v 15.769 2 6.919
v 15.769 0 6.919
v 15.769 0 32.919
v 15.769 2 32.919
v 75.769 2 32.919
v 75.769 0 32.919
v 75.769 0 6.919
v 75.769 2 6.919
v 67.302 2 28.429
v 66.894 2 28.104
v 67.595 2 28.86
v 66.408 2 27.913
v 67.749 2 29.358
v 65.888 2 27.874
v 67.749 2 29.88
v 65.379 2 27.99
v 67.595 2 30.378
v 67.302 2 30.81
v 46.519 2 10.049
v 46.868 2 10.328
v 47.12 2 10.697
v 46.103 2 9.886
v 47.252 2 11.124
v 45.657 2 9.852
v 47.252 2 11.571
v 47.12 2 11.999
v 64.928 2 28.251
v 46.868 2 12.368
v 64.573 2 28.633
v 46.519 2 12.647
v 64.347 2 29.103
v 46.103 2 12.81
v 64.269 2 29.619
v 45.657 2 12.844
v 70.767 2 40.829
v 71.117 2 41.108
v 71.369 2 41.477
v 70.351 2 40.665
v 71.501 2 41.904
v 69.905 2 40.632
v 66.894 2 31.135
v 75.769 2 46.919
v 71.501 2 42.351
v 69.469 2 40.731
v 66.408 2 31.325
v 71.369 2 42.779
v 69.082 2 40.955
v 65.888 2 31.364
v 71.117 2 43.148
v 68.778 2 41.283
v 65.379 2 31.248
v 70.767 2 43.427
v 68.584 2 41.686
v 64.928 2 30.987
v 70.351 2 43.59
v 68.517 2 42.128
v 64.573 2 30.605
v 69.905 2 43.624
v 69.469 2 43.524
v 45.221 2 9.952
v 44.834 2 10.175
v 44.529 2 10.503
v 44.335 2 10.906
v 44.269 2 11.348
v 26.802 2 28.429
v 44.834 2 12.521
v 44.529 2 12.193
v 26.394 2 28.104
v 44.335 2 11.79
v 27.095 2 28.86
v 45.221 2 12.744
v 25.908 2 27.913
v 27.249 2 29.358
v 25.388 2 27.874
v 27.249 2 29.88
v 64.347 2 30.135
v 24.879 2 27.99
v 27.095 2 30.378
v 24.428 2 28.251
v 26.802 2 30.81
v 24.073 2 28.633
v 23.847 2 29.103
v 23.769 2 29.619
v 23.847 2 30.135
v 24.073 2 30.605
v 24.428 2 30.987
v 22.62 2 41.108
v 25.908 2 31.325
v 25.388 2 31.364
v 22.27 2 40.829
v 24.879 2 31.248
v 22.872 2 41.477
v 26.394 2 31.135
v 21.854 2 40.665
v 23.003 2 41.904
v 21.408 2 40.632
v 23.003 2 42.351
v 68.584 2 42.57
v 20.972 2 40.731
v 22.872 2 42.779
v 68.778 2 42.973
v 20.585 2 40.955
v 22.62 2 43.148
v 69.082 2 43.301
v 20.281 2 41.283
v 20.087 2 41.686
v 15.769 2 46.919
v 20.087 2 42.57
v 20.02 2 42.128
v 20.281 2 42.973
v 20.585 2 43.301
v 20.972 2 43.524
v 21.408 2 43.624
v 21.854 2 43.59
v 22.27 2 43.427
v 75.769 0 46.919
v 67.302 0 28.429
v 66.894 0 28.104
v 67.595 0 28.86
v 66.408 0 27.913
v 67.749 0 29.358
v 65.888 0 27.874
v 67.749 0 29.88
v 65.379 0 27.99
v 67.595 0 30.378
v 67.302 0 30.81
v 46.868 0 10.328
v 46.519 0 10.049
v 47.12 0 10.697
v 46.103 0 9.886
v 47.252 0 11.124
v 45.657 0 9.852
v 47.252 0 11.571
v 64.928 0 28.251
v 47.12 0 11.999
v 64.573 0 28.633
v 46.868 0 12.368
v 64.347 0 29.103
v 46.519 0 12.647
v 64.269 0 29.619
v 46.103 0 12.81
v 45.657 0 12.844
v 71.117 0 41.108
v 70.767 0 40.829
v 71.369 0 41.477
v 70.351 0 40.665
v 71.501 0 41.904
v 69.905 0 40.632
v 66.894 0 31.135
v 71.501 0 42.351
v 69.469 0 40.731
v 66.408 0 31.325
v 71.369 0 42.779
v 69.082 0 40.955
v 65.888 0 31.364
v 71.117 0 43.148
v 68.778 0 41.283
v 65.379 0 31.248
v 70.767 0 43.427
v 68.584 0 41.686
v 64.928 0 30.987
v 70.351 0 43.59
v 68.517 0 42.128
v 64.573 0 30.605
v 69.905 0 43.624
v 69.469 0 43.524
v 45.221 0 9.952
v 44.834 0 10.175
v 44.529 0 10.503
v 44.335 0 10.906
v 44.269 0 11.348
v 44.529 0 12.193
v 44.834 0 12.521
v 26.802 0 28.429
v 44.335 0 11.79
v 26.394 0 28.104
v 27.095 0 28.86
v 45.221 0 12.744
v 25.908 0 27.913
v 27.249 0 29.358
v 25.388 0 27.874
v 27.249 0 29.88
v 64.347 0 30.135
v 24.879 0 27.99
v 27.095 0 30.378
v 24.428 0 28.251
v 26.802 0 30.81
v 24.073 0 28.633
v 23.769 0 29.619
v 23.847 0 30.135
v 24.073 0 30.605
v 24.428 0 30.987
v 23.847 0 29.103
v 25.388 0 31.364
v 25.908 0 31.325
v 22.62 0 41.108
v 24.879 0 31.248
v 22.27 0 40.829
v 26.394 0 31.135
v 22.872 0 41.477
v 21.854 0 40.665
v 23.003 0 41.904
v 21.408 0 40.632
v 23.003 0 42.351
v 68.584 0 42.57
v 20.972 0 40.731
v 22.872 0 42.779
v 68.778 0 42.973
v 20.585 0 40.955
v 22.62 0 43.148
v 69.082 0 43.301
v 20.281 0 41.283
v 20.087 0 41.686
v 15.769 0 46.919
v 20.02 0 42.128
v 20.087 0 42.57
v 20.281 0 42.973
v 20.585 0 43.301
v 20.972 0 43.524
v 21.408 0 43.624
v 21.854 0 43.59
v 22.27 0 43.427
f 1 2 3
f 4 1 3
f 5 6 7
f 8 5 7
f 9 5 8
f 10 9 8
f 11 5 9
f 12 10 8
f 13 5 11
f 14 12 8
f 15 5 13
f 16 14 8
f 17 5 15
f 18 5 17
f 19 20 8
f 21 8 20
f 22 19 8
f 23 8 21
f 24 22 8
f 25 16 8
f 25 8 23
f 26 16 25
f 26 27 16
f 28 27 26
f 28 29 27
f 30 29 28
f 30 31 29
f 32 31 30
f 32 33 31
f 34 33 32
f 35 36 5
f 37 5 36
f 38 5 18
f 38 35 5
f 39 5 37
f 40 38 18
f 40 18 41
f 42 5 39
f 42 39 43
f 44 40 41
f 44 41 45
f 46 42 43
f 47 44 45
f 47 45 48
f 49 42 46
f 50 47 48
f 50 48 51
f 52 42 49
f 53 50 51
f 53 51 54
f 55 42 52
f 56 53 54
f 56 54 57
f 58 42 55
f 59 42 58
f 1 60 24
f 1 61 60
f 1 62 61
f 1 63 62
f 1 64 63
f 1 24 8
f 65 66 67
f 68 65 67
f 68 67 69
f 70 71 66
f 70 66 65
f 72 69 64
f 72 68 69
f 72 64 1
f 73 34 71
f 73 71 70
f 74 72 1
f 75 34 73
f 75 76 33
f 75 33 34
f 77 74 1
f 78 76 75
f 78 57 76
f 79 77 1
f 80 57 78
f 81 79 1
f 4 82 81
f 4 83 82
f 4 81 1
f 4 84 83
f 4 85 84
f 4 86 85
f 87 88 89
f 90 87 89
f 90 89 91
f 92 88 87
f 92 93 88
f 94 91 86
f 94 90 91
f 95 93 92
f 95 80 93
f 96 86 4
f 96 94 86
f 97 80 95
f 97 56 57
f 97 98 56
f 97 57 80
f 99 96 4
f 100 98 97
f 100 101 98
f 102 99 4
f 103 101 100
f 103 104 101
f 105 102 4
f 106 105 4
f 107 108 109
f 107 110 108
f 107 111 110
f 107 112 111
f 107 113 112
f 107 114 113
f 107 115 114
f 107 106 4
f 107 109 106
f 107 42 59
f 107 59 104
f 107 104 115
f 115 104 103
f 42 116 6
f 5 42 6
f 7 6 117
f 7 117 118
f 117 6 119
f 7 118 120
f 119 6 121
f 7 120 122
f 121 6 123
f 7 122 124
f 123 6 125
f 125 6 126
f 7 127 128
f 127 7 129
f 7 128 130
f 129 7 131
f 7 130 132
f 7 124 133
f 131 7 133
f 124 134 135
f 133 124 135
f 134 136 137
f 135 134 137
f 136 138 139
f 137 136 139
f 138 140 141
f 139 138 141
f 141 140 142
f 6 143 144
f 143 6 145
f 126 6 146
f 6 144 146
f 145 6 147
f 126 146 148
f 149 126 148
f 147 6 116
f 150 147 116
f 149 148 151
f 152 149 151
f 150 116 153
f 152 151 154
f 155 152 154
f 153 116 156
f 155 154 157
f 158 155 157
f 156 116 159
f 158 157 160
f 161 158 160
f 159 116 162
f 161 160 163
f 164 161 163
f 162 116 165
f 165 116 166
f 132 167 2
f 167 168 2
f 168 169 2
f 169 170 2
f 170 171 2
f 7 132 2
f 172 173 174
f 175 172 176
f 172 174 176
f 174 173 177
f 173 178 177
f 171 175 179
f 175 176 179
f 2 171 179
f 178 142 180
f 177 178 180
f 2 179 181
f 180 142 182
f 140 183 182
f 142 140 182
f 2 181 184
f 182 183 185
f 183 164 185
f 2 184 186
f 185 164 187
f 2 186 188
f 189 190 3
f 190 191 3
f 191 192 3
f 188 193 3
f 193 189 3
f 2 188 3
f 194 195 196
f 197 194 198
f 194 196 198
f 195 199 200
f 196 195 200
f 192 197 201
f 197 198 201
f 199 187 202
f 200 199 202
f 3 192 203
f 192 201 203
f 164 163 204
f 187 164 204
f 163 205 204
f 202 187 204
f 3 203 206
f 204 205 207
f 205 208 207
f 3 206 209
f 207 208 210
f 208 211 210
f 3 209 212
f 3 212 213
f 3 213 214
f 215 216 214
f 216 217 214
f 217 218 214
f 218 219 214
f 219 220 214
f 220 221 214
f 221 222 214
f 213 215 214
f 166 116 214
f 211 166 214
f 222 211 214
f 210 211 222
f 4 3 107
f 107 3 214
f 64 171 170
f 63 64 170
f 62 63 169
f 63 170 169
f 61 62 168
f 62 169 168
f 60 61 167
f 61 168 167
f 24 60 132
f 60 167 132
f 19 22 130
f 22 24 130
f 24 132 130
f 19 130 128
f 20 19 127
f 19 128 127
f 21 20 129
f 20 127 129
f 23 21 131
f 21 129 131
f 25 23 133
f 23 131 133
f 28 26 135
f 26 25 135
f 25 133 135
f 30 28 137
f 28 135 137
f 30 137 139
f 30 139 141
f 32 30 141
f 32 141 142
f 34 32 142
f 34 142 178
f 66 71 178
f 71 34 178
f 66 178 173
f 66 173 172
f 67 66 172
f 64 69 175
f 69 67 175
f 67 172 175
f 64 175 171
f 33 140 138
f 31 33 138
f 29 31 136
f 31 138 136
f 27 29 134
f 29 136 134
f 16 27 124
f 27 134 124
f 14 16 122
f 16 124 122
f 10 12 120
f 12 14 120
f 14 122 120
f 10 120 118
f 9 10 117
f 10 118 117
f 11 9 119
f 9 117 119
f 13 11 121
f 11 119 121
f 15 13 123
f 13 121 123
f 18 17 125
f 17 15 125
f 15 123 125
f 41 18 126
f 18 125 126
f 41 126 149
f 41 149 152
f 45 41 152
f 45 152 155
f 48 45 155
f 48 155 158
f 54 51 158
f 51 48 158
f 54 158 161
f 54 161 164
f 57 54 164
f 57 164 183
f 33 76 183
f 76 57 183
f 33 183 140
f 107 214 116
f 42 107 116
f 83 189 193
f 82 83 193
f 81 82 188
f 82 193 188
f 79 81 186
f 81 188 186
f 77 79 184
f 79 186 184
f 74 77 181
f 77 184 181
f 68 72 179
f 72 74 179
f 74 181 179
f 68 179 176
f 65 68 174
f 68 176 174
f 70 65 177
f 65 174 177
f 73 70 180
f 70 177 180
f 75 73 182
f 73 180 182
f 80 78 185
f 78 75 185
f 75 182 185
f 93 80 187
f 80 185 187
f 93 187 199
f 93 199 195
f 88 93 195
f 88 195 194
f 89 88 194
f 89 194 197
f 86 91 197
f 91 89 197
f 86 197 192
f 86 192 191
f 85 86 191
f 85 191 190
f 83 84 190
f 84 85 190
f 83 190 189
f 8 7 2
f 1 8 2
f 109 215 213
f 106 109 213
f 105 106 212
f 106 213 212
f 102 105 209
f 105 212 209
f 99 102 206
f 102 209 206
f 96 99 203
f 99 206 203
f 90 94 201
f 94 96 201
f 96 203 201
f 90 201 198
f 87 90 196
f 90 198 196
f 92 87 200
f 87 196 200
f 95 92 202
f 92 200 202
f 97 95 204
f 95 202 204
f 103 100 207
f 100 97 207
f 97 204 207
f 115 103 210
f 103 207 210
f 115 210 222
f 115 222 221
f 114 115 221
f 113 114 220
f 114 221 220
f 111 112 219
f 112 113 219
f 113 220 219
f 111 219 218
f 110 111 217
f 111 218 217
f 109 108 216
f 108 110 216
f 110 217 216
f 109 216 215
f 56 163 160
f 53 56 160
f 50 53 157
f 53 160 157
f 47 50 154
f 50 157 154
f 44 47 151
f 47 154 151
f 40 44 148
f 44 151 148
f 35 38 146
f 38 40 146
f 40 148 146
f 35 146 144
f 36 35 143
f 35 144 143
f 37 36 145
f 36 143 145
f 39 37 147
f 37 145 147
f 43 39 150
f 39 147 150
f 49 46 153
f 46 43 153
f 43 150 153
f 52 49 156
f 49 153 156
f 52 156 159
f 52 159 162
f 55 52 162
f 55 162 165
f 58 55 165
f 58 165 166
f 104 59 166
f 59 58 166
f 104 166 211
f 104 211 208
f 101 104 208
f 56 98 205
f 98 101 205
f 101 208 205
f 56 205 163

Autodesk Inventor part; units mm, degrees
ref_plane "YZ Plane" through (0, 0, 0) normal (1, 0, 0) x (0, 1, 0)
ref_plane "XZ Plane" through (0, 0, 0) normal (0, 1, 0) x (-1, 0, 0)
ref_plane "XY Plane" through (0, 0, 0) normal (0, 0, 1) x (1, 0, 0)
sketch "Szkic1" plane through (0, 0, 0) normal (0, 1, 0) x (-1, 0, 0)
  line L0 (-75.7688, 32.9192) -> (-75.7688, 6.9192)
  line L1 (-75.7688, 6.9192) -> (-15.7688, 6.9192)
  line L2 (-15.7688, 6.9192) -> (-15.7688, 32.9192)
  circle A0 centre (-70.0174, 42.1278) radius 1.5
  circle A1 centre (-21.5202, 42.1278) radius 1.5
  circle A2 centre (-45.7688, 11.3479) radius 1.5
  circle A3 centre (-25.5188, 29.6192) radius 1.75
  circle A4 centre (-66.0188, 29.6192) radius 1.75
  line L3 (-75.7688, 6.9192) -> (-15.7688, 6.9192)
  line L4 (-15.7688, 6.9192) -> (-15.7688, 46.9192)
  line L5 (-15.7688, 46.9192) -> (-75.7688, 46.9192)
  line L6 (-75.7688, 46.9192) -> (-75.7688, 6.9192)
  point P0 (0, 0)
  dimension "d0" = 40
extrude "Wyciągnięcie proste1" add sketch "Szkic1" along normal blind 2
properties part number "dociazenie"
